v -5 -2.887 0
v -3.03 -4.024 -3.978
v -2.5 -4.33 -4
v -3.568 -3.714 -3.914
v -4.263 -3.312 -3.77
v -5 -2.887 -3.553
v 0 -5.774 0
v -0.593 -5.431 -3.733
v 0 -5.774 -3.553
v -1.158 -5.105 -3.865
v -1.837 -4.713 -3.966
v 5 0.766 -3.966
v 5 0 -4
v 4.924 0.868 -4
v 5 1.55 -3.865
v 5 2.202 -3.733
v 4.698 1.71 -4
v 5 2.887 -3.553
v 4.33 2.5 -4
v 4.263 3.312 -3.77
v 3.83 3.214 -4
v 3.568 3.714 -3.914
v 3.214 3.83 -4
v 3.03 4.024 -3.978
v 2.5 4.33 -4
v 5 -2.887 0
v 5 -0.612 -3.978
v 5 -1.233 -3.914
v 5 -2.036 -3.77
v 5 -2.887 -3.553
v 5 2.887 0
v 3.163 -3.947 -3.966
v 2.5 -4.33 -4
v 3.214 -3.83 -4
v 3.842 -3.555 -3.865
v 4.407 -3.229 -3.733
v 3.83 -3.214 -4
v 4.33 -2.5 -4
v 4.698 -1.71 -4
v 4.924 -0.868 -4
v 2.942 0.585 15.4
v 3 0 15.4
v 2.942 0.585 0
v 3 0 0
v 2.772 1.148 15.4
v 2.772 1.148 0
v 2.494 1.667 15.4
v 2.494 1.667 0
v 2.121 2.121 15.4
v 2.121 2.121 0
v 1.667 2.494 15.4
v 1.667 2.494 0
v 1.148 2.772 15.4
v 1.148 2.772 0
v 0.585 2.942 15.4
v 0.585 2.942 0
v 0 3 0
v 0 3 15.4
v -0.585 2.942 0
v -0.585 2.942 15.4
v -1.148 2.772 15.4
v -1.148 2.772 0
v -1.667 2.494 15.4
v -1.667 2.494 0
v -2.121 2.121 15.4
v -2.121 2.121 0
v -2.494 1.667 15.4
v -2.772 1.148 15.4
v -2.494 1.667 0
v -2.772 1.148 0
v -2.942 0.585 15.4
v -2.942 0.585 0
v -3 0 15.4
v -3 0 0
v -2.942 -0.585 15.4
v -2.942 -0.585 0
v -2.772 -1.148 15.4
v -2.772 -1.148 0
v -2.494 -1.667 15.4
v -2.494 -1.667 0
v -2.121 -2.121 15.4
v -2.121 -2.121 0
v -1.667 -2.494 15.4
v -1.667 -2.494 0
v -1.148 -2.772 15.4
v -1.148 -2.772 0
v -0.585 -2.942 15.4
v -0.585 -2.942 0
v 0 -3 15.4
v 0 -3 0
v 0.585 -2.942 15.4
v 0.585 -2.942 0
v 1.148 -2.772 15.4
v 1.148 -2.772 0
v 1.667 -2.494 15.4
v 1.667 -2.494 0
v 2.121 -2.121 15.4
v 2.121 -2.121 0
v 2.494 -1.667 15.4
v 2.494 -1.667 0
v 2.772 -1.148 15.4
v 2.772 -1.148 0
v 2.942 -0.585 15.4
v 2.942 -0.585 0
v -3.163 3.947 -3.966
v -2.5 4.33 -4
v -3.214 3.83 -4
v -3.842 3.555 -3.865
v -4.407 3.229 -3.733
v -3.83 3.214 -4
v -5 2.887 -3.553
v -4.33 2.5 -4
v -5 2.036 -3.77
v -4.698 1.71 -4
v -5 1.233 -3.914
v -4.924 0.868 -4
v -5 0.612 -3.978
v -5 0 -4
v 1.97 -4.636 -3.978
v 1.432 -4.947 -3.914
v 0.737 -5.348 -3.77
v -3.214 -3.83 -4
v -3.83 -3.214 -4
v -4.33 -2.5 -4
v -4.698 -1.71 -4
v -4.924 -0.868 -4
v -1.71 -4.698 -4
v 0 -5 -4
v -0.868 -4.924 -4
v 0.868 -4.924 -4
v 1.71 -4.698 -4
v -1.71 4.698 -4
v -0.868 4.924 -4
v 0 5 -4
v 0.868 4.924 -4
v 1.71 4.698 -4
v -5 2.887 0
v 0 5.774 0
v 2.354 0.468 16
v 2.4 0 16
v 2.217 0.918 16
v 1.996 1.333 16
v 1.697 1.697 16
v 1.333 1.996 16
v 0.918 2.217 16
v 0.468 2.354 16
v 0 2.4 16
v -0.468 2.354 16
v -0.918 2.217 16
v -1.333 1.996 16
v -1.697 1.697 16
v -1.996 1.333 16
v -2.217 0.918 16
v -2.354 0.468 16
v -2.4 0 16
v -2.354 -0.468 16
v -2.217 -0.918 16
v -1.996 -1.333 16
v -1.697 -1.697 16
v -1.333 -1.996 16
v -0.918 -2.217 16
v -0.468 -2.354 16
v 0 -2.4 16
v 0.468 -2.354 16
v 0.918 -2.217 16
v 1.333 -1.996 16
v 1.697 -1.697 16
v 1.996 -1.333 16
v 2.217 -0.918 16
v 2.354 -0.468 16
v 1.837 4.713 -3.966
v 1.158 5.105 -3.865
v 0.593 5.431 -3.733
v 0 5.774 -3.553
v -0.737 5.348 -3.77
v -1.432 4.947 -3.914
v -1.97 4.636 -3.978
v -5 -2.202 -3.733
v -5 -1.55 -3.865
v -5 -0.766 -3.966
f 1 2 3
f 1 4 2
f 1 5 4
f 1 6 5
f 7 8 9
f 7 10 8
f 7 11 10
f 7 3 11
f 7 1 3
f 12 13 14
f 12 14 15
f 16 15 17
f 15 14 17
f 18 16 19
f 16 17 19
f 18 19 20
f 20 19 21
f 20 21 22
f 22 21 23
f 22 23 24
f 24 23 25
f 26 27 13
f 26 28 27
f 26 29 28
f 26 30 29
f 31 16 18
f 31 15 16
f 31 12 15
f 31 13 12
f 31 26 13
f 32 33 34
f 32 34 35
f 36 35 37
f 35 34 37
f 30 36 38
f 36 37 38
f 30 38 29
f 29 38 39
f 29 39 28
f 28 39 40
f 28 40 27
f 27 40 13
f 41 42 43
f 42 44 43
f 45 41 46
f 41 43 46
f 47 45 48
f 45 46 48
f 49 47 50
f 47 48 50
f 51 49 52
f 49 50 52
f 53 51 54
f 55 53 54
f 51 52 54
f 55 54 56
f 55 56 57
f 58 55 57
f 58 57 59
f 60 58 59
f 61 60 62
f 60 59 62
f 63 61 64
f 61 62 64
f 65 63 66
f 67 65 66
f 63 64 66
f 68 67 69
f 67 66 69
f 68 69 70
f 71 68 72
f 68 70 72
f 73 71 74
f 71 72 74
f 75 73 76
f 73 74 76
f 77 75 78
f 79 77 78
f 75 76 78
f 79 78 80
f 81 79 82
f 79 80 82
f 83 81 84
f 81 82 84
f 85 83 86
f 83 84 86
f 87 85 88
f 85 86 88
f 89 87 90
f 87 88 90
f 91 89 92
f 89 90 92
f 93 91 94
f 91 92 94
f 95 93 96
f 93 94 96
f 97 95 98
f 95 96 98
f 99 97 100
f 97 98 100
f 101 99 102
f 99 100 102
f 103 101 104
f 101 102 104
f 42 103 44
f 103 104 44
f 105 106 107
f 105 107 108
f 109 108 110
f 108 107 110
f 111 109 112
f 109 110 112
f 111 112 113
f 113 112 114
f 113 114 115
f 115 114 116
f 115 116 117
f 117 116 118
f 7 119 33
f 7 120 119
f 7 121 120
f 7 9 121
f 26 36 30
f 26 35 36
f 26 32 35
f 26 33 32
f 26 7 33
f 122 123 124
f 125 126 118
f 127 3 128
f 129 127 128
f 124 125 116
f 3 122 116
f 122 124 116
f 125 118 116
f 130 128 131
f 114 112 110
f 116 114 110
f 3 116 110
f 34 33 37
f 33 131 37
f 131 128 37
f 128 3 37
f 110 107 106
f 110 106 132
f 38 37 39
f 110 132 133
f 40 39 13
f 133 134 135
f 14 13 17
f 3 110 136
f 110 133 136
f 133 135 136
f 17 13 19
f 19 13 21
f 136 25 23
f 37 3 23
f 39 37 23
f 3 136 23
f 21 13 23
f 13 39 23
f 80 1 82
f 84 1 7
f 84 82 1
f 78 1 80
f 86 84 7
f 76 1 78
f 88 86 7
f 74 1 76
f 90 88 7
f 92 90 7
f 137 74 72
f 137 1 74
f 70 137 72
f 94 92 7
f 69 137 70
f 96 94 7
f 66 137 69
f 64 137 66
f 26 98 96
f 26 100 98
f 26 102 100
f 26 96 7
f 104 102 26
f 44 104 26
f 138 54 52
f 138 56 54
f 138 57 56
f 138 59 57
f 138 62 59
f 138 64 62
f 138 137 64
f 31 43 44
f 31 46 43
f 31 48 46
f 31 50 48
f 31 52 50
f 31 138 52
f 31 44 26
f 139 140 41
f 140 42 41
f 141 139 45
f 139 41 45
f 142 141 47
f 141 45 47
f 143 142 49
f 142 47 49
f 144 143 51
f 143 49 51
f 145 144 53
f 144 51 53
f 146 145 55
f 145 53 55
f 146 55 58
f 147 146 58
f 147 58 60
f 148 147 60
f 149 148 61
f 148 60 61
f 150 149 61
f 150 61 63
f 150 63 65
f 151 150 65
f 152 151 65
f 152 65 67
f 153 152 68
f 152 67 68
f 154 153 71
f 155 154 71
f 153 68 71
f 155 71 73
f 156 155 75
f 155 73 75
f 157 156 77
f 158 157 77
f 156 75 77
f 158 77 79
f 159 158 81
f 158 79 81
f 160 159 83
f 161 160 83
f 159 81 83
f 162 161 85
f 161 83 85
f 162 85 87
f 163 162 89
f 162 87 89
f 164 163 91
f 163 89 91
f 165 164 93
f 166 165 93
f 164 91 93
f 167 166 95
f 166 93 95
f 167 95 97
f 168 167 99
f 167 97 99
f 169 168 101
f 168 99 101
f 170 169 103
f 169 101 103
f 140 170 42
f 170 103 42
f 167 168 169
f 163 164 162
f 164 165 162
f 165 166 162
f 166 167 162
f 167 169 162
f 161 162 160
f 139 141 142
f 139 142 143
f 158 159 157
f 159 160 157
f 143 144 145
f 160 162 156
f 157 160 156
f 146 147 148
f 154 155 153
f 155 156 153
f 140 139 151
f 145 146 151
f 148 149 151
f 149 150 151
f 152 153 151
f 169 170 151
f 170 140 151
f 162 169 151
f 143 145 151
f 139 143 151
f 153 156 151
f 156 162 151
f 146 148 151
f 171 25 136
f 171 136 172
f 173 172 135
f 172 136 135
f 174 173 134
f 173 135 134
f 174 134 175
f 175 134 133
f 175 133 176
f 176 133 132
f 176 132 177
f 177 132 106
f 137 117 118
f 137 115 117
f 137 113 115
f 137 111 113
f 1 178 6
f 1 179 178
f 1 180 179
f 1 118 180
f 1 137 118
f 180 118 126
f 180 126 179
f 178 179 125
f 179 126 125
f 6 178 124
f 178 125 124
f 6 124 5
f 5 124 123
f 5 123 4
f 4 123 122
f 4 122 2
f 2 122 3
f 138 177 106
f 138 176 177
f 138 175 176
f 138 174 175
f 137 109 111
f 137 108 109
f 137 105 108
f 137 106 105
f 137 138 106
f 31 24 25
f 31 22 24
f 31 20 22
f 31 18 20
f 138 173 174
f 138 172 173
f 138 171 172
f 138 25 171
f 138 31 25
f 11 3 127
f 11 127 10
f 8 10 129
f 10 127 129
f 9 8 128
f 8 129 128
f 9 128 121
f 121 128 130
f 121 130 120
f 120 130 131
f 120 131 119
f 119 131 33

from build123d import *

# Parameters (mm, degrees)
ESQUISSE1_W        = 3
ESQUISSE1_H        = 16
BOSS_EXTRU_1_DEPTH = 4


with BuildPart() as part:
    # Esquisse1 → Base-Révolution (revolve)
    with BuildSketch(Plane(origin=(0, 0, 0), x_dir=(1, 0, 0), z_dir=(0, 1, 0))):
        with Locations((1.5, -8)):
            Rectangle(ESQUISSE1_W, ESQUISSE1_H)
    revolve(axis=Axis((0, 0, 0), (0, 0, 1)))

    # Chanfrein1: read off the stored shape, not the designer's step
    # Chanfrein1 outline → Chanfrein1 (revolve, cut)
    with BuildSketch(Plane.XZ):
        Polygon((3, 16), (2.4, 16), (3, 15.4), align=None)
    revolve(axis=Axis((0, 0, 0), (0, 0, 1)), mode=Mode.SUBTRACT)

    # Esquisse6 → Boss.-Extru.1 (add)
    with BuildSketch(Plane.XY):
        Polygon((5, -2.886751346), (5, 2.886751346), (0, 5.773502692), (-5, 2.886751346), (-5, -2.886751346), (0, -5.773502692), align=None)
    extrude(amount=-BOSS_EXTRU_1_DEPTH)

    # Esquisse7 → Enlèvement de matière-Révolution1 (revolve, cut)
    with BuildSketch(Plane(origin=(0, 0, 0), x_dir=(1, 0, 0), z_dir=(0, 1, 0))):
        Polygon((-5, 4), (-11.92820323, 4), (-11.92820323, 0), align=None)
    revolve(axis=Axis((0, 0, -6.239446496), (0, 0, 1)), mode=Mode.SUBTRACT)


solid = part.part
